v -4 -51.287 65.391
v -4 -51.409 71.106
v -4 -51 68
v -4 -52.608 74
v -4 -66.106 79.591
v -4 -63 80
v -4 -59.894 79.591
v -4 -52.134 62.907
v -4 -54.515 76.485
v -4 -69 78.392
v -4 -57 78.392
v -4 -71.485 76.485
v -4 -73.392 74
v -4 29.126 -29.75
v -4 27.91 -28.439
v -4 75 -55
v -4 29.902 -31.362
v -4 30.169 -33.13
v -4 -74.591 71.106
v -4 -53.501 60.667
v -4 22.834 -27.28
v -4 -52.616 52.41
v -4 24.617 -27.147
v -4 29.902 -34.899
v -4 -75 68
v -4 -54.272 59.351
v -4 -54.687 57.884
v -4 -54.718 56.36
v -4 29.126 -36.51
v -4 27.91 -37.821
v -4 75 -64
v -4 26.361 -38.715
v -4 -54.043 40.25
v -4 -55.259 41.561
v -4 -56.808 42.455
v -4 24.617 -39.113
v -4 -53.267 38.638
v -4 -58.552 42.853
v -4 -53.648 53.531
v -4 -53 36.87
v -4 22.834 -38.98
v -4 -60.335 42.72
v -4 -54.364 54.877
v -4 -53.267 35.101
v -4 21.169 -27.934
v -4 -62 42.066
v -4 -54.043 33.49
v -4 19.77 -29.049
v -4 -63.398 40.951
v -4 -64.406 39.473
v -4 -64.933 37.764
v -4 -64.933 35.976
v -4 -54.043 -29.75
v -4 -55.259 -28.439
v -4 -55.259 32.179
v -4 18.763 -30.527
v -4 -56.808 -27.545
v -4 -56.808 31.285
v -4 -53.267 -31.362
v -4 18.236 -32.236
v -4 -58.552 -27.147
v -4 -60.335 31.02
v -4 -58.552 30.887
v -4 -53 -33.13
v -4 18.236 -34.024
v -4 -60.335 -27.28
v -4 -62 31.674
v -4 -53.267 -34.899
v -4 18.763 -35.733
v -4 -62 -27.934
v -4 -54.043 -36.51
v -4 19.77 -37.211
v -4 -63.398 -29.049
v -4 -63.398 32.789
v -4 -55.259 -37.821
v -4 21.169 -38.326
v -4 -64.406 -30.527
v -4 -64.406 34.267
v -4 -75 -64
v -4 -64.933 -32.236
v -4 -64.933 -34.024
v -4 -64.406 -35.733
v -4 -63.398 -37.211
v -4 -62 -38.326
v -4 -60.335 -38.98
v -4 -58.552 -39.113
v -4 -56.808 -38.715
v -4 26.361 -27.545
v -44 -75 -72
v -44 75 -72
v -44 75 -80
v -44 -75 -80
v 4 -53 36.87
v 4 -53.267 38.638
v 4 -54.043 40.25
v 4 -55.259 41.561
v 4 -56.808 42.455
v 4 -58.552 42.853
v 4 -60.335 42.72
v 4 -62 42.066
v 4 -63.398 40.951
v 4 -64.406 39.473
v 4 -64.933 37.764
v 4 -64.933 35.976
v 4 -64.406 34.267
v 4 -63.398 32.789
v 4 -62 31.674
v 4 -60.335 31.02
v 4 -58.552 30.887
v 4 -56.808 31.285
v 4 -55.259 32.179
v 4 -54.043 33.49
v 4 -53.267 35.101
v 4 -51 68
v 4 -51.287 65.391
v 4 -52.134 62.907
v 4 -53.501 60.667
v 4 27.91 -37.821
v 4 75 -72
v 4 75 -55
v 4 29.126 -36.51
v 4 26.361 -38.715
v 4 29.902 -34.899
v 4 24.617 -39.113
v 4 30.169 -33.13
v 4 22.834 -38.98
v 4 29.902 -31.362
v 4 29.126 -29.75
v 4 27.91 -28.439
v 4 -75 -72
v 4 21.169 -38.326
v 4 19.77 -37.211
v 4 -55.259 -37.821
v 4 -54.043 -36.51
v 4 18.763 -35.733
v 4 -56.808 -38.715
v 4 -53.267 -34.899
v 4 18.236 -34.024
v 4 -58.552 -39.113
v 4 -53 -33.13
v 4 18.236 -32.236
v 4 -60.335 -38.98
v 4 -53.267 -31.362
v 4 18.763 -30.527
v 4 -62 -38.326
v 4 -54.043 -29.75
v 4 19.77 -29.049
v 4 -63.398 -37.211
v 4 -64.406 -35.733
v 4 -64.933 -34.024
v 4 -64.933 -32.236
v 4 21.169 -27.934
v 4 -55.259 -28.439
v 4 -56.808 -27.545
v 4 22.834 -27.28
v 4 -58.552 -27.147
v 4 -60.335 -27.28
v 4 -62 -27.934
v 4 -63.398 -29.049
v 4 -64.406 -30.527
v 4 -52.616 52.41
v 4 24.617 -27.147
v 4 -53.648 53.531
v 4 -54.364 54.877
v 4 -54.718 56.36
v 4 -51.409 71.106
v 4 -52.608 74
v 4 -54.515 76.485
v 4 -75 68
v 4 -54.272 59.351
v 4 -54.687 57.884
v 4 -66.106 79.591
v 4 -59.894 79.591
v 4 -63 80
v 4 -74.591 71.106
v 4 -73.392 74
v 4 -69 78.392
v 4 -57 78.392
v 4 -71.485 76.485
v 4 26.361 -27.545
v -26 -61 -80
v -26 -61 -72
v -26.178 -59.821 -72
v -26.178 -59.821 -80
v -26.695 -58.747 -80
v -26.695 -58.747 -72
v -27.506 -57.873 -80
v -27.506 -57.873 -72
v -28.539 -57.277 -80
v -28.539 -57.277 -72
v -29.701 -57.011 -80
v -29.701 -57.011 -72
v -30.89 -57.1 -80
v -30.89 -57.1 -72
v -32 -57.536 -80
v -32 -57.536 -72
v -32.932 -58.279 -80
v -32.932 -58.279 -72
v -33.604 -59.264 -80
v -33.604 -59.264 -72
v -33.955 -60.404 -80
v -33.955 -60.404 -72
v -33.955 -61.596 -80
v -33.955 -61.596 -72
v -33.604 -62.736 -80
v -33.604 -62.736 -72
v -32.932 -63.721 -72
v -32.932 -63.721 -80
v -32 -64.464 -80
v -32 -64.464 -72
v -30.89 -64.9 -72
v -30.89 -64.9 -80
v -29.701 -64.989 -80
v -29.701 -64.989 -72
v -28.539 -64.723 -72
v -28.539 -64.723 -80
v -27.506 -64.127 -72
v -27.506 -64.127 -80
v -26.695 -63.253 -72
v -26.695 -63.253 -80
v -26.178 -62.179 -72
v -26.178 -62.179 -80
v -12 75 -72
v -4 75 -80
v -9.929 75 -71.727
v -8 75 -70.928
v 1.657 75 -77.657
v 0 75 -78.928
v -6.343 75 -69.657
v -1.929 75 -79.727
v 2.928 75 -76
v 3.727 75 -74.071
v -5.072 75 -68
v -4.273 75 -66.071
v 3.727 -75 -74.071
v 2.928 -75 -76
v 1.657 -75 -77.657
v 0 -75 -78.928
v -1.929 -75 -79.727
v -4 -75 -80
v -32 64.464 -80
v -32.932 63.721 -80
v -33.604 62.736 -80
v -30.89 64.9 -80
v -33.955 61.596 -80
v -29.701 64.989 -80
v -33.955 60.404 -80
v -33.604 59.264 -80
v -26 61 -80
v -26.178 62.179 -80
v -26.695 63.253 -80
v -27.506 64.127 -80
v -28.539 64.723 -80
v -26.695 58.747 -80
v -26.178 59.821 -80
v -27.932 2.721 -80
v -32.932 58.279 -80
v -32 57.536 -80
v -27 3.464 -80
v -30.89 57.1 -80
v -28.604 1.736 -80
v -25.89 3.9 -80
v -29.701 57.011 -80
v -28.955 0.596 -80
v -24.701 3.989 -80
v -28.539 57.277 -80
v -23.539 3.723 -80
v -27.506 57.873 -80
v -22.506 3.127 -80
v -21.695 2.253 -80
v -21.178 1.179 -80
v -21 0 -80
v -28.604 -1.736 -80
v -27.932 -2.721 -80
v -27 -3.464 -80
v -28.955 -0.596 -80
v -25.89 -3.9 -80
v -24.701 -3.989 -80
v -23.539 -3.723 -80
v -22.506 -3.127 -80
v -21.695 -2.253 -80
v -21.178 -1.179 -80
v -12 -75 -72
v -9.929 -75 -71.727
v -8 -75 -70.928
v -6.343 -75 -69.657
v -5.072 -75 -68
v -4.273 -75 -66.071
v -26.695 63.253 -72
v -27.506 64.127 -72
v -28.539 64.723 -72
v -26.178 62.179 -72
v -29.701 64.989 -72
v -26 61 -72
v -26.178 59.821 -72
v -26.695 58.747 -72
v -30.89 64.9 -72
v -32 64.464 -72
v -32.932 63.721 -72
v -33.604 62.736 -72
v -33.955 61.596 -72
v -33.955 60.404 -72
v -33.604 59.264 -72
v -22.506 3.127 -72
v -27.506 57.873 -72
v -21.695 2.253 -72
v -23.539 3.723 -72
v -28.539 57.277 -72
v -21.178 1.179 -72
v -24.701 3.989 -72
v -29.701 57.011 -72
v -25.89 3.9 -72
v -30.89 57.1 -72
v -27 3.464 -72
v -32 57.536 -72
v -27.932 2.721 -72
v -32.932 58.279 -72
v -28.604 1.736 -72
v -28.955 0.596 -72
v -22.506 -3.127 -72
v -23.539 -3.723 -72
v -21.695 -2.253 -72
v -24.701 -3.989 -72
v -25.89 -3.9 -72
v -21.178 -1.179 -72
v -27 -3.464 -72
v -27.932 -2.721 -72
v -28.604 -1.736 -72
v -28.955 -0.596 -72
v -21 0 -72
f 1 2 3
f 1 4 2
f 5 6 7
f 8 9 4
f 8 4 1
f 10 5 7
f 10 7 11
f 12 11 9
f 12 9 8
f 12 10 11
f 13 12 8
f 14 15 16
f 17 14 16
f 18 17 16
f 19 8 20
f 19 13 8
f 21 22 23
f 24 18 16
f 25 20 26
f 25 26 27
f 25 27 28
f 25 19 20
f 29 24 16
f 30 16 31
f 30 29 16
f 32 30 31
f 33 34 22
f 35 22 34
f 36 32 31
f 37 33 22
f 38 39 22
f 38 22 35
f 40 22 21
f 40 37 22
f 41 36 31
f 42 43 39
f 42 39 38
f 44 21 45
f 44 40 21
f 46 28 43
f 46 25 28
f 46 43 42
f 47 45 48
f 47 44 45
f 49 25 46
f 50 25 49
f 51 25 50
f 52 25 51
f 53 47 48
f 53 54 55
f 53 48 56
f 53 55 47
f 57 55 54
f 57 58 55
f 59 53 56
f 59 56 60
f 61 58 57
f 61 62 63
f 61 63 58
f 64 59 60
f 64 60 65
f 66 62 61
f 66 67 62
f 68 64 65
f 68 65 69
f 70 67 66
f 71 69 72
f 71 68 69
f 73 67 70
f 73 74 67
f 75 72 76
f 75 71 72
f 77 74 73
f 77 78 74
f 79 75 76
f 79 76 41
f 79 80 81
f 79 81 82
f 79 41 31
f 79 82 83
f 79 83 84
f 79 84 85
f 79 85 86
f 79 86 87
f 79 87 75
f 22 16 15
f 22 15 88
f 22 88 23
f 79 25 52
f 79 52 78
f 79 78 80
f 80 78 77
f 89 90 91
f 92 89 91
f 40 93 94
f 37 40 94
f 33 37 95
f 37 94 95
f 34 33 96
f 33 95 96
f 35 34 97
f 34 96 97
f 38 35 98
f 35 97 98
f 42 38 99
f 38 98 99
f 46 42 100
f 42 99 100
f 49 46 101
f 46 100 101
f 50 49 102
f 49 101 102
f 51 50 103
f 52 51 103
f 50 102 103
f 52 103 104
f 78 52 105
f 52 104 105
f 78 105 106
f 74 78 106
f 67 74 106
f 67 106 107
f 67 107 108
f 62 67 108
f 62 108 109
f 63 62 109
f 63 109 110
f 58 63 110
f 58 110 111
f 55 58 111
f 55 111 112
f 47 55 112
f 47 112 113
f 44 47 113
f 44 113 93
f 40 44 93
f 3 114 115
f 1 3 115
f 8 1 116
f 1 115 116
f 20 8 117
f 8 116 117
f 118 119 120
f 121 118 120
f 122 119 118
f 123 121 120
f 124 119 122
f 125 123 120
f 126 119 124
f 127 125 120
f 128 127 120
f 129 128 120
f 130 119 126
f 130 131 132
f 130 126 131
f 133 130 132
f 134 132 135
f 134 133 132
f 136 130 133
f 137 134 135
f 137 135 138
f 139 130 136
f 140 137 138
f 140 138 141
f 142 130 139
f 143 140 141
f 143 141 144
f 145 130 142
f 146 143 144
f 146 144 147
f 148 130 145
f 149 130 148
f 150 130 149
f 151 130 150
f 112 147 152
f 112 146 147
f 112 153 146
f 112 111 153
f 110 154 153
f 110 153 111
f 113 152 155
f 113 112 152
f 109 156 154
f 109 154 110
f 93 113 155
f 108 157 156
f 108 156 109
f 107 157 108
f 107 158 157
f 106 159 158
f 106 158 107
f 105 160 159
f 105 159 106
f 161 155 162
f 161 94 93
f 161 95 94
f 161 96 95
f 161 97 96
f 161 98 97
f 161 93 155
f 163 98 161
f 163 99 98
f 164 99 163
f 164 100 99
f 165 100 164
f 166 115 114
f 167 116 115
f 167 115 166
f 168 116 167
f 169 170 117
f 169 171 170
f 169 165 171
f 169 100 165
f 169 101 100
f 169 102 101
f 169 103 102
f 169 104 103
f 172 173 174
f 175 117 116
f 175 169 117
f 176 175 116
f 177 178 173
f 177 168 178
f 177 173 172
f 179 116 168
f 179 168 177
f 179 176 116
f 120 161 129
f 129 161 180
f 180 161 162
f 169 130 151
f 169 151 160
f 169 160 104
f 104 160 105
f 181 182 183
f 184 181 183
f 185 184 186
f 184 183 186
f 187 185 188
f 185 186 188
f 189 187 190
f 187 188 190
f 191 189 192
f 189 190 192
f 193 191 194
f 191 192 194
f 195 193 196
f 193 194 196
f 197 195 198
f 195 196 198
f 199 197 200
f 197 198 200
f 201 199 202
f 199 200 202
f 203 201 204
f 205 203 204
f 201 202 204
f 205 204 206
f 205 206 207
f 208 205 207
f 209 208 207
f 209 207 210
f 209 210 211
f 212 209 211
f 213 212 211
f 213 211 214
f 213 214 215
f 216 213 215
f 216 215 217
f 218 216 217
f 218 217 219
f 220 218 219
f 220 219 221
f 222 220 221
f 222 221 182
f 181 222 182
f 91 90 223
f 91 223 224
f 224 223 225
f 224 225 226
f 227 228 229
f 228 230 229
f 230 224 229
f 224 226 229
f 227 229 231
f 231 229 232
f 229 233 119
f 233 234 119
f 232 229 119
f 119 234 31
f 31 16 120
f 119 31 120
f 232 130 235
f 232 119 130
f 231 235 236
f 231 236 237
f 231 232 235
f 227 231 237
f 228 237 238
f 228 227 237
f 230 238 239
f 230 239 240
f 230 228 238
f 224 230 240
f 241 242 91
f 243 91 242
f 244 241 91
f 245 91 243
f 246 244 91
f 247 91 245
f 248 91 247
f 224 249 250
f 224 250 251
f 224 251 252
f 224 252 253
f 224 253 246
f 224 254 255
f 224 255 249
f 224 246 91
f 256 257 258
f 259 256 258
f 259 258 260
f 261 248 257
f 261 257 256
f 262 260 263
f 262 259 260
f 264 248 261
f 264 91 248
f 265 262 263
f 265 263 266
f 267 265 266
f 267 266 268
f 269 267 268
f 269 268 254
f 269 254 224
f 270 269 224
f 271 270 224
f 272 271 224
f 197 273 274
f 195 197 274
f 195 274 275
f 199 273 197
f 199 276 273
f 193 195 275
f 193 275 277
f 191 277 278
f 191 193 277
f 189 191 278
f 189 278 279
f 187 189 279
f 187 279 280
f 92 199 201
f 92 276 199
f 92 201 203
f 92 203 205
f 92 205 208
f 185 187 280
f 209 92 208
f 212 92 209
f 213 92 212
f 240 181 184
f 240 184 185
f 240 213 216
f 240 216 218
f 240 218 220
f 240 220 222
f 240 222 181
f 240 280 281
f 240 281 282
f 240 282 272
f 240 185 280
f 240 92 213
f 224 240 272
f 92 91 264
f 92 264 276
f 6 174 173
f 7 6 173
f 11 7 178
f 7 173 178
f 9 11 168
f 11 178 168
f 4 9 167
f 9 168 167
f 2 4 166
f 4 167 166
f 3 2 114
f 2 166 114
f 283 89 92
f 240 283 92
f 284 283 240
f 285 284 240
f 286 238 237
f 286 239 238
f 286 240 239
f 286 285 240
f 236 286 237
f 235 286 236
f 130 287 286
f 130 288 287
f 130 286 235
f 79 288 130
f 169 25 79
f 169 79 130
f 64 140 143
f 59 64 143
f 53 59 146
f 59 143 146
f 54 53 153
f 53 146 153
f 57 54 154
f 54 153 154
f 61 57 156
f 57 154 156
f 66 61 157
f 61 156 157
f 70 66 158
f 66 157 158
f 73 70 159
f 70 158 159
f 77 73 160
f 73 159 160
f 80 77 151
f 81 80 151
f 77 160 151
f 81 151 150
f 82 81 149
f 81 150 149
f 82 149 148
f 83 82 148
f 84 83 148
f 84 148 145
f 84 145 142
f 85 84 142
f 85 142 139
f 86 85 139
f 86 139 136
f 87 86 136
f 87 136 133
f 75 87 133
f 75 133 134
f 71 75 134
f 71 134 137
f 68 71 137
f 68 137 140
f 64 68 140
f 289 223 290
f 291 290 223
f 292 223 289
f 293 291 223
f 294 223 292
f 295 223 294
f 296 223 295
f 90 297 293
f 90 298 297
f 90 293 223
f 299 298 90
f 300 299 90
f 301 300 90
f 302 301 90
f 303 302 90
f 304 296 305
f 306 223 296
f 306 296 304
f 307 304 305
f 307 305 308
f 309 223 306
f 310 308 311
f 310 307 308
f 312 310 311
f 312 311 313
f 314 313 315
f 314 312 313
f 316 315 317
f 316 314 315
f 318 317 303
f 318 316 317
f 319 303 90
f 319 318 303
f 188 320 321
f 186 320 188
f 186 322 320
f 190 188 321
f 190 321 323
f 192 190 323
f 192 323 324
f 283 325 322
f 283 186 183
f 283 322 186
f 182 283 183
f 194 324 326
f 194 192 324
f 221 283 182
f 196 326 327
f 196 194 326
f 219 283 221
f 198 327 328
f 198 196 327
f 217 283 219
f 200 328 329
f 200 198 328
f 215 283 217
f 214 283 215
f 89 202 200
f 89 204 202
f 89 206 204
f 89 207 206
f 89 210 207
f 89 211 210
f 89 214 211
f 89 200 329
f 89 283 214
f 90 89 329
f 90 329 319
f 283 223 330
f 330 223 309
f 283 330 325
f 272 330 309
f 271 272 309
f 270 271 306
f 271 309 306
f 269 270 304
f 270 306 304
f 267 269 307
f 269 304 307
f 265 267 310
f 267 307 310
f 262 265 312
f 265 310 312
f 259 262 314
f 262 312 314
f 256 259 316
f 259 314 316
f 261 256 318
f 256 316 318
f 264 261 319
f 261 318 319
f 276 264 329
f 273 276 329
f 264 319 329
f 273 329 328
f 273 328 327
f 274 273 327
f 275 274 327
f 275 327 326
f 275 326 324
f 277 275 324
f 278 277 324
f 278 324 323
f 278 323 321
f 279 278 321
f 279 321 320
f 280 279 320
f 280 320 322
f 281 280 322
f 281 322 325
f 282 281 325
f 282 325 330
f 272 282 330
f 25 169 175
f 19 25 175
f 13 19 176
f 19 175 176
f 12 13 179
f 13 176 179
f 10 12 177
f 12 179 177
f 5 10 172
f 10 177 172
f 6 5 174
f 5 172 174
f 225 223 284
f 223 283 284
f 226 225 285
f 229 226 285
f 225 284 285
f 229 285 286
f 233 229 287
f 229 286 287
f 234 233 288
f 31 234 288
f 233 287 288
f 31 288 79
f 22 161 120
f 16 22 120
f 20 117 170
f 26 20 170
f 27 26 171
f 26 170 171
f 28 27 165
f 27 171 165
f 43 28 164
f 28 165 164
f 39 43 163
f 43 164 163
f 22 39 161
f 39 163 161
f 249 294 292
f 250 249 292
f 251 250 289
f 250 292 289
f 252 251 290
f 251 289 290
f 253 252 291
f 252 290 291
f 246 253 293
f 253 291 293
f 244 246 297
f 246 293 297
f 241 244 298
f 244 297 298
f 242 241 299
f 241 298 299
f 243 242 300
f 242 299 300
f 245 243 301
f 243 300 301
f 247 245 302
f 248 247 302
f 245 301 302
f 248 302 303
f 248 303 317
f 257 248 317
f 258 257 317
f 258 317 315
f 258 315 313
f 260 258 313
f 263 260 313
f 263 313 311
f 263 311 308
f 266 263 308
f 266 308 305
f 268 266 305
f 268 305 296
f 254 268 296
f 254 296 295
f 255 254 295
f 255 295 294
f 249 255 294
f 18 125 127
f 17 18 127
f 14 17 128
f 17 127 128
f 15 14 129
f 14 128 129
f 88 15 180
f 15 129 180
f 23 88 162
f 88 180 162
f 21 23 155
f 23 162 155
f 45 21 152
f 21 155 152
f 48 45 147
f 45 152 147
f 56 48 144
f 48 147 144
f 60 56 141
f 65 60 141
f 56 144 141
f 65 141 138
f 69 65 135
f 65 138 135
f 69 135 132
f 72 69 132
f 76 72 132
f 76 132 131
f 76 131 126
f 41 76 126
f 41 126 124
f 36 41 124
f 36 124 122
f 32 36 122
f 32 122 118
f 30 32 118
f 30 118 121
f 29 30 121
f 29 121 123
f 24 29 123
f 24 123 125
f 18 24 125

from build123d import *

# Parameters (mm, degrees)
F1_DEPTH = 75
F2_R     = 8
F3_R     = 6
F4_DEPTH = 48.001
F5_R     = 4
F6_DEPTH = 80.001


with BuildPart() as f1:
    # F0 (on Front) → F1 (new body, symmetric)
    with BuildSketch(Plane.XZ):
        Polygon((4, 80), (-4, 80), (-4, -72), (-44, -72), (-44, -80), (4, -80), align=None)
    extrude(amount=F1_DEPTH, both=True)

    # F2
    f2_edges = [f1.edges().sort_by_distance(p)[0] for p in [
        (-4, 0, -72),
        (4, 0, -80),
    ]]
    fillet(f2_edges, radius=F2_R)

    # F3 (on face) → F4 (cut, through all)
    with BuildSketch(Plane.YZ.offset(4)):
        with BuildLine():
            ThreePointArc((-63, 80), (-54.514719, 76.485281), (-51, 68))
            ThreePointArc((-51, 68), (-51.64257, 64.125884), (-53.501462, 60.666667))
            ThreePointArc((-53.501462, 60.666667), (-54.717975, 56.360123), (-52.61582, 52.409533))
            Line((-52.61582, 52.409533), (75, -55))
            Line((75, -55), (75, 80))
            Line((75, 80), (-63, 80))
        make_face()
        with BuildLine():
            ThreePointArc((-75, 68), (-71.485281, 76.485281), (-63, 80))
            Line((-63, 80), (-75, 80))
            Line((-75, 80), (-75, 68))
        make_face()
        with Locations((-59, 36.869957)):
            Circle(F3_R)
        with Locations((-59, -33.130043)):
            Circle(F3_R)
        with Locations((24.168664, -33.130043)):
            Circle(F3_R)
    extrude(amount=-F4_DEPTH, mode=Mode.SUBTRACT)

    # F5 (on Top) → F6 (cut, through all)
    with BuildSketch(Plane.XY):
        with Locations((-30, -61)):
            Circle(F5_R)
        with Locations((-25, 0)):
            Circle(F5_R)
        with Locations((-30, 61)):
            Circle(F5_R)
    extrude(amount=-F6_DEPTH, mode=Mode.SUBTRACT)


solid = f1.part
